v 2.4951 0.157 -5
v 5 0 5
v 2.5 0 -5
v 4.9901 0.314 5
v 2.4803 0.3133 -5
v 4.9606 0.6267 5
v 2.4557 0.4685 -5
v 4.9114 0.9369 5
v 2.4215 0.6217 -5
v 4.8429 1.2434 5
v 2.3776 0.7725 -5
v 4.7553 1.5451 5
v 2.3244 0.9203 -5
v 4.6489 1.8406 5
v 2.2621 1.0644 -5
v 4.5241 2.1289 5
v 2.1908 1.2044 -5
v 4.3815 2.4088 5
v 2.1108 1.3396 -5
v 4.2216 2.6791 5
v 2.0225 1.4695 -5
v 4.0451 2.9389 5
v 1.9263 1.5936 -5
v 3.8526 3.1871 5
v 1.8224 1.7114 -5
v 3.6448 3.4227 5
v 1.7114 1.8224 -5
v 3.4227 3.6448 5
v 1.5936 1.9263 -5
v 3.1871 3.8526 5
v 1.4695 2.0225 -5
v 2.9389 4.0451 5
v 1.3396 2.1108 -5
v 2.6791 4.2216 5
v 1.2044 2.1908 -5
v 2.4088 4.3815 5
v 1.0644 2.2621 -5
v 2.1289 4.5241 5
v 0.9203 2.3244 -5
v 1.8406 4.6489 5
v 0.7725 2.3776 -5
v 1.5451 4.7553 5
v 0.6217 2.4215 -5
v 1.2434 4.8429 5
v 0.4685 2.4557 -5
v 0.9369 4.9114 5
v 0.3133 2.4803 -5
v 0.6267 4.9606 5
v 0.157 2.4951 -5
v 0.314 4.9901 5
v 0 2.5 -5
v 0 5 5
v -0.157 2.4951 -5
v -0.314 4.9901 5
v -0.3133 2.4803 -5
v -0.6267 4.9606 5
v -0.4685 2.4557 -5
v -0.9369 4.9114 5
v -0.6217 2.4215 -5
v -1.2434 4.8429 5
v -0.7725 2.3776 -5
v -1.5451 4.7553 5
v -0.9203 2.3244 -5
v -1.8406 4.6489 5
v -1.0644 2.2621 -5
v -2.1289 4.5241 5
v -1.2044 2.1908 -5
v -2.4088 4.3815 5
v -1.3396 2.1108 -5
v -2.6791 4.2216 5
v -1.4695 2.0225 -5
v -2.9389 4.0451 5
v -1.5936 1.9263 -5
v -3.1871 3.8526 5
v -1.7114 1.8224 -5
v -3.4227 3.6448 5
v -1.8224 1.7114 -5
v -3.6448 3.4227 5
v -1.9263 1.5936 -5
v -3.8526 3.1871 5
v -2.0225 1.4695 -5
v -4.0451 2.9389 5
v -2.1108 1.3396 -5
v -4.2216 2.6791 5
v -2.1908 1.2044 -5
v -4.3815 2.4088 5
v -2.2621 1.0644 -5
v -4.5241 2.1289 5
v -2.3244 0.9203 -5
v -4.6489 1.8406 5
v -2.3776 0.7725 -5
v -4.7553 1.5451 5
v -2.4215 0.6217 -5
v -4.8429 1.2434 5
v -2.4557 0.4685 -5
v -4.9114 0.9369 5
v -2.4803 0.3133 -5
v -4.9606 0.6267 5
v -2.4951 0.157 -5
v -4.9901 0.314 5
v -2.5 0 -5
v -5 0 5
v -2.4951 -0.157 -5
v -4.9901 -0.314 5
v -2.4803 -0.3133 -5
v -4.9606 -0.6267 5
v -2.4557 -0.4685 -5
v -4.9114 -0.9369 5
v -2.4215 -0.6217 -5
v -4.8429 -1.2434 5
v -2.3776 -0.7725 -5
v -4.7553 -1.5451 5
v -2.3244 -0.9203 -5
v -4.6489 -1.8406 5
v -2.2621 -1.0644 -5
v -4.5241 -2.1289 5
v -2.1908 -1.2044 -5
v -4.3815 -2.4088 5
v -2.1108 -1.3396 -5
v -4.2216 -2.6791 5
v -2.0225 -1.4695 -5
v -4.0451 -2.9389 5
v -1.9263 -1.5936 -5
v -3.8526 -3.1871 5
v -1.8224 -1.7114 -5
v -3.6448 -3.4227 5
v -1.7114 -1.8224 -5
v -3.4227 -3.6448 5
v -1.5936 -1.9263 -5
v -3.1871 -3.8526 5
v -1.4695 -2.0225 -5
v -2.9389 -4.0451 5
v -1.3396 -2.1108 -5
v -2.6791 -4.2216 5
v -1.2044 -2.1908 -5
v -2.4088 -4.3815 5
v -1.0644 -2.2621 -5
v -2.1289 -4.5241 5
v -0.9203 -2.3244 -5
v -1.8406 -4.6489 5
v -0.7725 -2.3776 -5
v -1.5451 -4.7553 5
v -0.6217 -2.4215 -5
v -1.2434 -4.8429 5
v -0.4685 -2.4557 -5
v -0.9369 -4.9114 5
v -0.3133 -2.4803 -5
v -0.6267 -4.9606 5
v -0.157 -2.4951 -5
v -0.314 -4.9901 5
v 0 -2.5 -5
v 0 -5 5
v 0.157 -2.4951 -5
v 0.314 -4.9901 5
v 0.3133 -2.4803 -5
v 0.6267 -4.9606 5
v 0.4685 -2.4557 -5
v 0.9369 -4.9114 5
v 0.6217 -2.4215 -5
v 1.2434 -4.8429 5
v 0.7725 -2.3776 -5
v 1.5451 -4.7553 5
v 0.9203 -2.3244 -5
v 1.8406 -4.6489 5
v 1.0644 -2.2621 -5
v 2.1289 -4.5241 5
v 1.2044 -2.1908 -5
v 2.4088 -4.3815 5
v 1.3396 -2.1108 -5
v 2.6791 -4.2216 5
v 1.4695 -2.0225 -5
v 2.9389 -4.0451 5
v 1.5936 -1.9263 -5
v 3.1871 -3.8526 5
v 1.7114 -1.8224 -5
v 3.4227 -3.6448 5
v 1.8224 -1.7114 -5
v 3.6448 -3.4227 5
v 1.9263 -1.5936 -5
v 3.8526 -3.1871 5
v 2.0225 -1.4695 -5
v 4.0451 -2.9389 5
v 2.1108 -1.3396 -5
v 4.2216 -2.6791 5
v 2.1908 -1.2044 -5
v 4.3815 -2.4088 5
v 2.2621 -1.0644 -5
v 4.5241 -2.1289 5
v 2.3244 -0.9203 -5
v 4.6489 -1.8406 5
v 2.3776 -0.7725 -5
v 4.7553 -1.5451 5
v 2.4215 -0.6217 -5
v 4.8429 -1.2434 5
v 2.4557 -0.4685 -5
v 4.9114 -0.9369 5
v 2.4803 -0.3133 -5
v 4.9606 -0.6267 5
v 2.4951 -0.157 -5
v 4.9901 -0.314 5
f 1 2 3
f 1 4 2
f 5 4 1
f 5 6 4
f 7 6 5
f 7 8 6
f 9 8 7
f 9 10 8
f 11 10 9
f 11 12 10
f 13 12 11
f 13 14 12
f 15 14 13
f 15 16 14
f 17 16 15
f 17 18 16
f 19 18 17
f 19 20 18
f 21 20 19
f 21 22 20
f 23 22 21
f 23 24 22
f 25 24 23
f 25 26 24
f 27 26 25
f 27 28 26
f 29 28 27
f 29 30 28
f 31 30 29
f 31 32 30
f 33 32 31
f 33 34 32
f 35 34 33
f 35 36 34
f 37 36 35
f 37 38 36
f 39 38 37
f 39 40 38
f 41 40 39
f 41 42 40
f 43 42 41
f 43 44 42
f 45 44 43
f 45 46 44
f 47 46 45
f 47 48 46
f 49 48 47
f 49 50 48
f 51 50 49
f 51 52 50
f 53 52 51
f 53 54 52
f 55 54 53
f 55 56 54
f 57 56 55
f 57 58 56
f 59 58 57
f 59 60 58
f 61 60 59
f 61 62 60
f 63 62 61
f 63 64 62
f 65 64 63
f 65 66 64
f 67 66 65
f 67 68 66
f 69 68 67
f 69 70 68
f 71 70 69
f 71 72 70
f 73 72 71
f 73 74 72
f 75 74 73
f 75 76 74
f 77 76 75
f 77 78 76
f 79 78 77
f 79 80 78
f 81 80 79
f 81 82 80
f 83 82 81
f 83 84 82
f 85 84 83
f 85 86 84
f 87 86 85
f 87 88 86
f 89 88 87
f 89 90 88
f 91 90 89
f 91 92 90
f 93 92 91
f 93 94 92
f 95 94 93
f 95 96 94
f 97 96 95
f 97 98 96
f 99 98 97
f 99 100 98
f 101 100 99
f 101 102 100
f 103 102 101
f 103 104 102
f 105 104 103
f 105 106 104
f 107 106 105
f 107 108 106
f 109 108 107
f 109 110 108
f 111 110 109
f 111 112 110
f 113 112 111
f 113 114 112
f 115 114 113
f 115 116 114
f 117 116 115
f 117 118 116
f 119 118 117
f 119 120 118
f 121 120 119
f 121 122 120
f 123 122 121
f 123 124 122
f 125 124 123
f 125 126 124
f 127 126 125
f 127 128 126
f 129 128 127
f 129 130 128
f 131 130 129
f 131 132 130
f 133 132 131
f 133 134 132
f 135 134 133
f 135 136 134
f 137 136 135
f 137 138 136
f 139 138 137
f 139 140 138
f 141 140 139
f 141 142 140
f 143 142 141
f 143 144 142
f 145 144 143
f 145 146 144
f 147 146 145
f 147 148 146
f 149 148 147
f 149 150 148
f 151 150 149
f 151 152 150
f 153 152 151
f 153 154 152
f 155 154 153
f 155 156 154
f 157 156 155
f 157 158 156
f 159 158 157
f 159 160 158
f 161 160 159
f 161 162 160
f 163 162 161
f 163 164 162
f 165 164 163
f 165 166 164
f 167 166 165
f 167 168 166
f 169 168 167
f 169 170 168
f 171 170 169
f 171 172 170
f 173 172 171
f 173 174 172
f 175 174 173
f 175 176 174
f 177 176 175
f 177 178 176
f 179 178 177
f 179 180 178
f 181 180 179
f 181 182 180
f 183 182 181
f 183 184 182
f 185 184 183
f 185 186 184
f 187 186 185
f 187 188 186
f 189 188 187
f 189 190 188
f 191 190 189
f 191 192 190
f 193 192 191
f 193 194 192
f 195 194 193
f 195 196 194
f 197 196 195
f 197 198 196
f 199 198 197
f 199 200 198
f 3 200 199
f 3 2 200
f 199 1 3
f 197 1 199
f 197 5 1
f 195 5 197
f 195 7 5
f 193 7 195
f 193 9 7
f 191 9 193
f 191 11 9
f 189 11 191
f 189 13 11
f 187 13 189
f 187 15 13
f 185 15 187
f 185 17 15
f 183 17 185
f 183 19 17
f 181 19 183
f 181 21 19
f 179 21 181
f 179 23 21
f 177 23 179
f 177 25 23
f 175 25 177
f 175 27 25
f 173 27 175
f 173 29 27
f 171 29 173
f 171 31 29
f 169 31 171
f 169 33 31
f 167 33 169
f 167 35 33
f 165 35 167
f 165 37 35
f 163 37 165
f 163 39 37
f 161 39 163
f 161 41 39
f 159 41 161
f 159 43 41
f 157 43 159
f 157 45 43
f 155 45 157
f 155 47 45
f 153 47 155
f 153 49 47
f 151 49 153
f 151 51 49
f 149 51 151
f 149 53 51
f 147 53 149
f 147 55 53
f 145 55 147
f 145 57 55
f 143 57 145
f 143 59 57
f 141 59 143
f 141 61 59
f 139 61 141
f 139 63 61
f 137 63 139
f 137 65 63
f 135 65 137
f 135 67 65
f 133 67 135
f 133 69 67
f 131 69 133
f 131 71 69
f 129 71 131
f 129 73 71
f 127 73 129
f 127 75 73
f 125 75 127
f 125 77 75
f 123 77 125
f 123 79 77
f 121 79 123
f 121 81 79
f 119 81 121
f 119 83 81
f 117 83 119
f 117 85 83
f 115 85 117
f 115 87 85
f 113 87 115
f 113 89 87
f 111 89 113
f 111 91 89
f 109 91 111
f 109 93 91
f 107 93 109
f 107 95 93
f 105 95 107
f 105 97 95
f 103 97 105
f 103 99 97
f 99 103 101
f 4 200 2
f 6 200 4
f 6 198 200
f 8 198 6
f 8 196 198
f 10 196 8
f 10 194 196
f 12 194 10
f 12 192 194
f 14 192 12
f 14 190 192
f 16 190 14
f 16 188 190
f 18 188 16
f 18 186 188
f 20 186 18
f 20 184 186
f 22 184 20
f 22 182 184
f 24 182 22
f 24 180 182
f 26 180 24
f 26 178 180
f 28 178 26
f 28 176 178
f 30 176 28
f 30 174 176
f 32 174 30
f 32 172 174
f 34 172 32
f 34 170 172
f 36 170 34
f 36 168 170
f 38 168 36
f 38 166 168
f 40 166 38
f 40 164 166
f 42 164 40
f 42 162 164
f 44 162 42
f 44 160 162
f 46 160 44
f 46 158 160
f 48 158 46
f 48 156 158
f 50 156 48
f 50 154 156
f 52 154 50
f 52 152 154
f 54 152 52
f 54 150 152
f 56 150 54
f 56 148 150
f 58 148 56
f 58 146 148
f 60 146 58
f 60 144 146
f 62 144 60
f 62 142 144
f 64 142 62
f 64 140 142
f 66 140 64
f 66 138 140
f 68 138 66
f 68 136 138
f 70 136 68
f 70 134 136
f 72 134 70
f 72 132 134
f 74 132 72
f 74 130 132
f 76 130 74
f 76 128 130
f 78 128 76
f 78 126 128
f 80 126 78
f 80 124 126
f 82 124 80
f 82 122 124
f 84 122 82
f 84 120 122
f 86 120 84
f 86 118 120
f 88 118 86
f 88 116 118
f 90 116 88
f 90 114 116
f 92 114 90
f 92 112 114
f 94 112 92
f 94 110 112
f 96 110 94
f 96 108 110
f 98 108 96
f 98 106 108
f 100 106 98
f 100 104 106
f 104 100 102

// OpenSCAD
/*
 * The cylinder function draws both a cylinder and cones.
 * Parameters:
 *      h - the height of the cylinder or cone
 *      r - radius of cylinder
 *      r1 - radius of the bottom of the cone
 *      r2 - radius of the top of the cone
 *      d - diameter of the cylinder
 *      d1 - diameter of the bottom of the cone
 *      d2 - diameter of the top of the cone
 *      center - boolean specifying if the cylinder is centered on (0, 0, 0) or not
 *      $fa - fragment angle in degrees
 *      $fs - fragment size in mm
 *      $fn - resolution of the object
 */
cylinder(h = 10, r1 = 2.5, r2 = 5, center = true, $fn = 100);
